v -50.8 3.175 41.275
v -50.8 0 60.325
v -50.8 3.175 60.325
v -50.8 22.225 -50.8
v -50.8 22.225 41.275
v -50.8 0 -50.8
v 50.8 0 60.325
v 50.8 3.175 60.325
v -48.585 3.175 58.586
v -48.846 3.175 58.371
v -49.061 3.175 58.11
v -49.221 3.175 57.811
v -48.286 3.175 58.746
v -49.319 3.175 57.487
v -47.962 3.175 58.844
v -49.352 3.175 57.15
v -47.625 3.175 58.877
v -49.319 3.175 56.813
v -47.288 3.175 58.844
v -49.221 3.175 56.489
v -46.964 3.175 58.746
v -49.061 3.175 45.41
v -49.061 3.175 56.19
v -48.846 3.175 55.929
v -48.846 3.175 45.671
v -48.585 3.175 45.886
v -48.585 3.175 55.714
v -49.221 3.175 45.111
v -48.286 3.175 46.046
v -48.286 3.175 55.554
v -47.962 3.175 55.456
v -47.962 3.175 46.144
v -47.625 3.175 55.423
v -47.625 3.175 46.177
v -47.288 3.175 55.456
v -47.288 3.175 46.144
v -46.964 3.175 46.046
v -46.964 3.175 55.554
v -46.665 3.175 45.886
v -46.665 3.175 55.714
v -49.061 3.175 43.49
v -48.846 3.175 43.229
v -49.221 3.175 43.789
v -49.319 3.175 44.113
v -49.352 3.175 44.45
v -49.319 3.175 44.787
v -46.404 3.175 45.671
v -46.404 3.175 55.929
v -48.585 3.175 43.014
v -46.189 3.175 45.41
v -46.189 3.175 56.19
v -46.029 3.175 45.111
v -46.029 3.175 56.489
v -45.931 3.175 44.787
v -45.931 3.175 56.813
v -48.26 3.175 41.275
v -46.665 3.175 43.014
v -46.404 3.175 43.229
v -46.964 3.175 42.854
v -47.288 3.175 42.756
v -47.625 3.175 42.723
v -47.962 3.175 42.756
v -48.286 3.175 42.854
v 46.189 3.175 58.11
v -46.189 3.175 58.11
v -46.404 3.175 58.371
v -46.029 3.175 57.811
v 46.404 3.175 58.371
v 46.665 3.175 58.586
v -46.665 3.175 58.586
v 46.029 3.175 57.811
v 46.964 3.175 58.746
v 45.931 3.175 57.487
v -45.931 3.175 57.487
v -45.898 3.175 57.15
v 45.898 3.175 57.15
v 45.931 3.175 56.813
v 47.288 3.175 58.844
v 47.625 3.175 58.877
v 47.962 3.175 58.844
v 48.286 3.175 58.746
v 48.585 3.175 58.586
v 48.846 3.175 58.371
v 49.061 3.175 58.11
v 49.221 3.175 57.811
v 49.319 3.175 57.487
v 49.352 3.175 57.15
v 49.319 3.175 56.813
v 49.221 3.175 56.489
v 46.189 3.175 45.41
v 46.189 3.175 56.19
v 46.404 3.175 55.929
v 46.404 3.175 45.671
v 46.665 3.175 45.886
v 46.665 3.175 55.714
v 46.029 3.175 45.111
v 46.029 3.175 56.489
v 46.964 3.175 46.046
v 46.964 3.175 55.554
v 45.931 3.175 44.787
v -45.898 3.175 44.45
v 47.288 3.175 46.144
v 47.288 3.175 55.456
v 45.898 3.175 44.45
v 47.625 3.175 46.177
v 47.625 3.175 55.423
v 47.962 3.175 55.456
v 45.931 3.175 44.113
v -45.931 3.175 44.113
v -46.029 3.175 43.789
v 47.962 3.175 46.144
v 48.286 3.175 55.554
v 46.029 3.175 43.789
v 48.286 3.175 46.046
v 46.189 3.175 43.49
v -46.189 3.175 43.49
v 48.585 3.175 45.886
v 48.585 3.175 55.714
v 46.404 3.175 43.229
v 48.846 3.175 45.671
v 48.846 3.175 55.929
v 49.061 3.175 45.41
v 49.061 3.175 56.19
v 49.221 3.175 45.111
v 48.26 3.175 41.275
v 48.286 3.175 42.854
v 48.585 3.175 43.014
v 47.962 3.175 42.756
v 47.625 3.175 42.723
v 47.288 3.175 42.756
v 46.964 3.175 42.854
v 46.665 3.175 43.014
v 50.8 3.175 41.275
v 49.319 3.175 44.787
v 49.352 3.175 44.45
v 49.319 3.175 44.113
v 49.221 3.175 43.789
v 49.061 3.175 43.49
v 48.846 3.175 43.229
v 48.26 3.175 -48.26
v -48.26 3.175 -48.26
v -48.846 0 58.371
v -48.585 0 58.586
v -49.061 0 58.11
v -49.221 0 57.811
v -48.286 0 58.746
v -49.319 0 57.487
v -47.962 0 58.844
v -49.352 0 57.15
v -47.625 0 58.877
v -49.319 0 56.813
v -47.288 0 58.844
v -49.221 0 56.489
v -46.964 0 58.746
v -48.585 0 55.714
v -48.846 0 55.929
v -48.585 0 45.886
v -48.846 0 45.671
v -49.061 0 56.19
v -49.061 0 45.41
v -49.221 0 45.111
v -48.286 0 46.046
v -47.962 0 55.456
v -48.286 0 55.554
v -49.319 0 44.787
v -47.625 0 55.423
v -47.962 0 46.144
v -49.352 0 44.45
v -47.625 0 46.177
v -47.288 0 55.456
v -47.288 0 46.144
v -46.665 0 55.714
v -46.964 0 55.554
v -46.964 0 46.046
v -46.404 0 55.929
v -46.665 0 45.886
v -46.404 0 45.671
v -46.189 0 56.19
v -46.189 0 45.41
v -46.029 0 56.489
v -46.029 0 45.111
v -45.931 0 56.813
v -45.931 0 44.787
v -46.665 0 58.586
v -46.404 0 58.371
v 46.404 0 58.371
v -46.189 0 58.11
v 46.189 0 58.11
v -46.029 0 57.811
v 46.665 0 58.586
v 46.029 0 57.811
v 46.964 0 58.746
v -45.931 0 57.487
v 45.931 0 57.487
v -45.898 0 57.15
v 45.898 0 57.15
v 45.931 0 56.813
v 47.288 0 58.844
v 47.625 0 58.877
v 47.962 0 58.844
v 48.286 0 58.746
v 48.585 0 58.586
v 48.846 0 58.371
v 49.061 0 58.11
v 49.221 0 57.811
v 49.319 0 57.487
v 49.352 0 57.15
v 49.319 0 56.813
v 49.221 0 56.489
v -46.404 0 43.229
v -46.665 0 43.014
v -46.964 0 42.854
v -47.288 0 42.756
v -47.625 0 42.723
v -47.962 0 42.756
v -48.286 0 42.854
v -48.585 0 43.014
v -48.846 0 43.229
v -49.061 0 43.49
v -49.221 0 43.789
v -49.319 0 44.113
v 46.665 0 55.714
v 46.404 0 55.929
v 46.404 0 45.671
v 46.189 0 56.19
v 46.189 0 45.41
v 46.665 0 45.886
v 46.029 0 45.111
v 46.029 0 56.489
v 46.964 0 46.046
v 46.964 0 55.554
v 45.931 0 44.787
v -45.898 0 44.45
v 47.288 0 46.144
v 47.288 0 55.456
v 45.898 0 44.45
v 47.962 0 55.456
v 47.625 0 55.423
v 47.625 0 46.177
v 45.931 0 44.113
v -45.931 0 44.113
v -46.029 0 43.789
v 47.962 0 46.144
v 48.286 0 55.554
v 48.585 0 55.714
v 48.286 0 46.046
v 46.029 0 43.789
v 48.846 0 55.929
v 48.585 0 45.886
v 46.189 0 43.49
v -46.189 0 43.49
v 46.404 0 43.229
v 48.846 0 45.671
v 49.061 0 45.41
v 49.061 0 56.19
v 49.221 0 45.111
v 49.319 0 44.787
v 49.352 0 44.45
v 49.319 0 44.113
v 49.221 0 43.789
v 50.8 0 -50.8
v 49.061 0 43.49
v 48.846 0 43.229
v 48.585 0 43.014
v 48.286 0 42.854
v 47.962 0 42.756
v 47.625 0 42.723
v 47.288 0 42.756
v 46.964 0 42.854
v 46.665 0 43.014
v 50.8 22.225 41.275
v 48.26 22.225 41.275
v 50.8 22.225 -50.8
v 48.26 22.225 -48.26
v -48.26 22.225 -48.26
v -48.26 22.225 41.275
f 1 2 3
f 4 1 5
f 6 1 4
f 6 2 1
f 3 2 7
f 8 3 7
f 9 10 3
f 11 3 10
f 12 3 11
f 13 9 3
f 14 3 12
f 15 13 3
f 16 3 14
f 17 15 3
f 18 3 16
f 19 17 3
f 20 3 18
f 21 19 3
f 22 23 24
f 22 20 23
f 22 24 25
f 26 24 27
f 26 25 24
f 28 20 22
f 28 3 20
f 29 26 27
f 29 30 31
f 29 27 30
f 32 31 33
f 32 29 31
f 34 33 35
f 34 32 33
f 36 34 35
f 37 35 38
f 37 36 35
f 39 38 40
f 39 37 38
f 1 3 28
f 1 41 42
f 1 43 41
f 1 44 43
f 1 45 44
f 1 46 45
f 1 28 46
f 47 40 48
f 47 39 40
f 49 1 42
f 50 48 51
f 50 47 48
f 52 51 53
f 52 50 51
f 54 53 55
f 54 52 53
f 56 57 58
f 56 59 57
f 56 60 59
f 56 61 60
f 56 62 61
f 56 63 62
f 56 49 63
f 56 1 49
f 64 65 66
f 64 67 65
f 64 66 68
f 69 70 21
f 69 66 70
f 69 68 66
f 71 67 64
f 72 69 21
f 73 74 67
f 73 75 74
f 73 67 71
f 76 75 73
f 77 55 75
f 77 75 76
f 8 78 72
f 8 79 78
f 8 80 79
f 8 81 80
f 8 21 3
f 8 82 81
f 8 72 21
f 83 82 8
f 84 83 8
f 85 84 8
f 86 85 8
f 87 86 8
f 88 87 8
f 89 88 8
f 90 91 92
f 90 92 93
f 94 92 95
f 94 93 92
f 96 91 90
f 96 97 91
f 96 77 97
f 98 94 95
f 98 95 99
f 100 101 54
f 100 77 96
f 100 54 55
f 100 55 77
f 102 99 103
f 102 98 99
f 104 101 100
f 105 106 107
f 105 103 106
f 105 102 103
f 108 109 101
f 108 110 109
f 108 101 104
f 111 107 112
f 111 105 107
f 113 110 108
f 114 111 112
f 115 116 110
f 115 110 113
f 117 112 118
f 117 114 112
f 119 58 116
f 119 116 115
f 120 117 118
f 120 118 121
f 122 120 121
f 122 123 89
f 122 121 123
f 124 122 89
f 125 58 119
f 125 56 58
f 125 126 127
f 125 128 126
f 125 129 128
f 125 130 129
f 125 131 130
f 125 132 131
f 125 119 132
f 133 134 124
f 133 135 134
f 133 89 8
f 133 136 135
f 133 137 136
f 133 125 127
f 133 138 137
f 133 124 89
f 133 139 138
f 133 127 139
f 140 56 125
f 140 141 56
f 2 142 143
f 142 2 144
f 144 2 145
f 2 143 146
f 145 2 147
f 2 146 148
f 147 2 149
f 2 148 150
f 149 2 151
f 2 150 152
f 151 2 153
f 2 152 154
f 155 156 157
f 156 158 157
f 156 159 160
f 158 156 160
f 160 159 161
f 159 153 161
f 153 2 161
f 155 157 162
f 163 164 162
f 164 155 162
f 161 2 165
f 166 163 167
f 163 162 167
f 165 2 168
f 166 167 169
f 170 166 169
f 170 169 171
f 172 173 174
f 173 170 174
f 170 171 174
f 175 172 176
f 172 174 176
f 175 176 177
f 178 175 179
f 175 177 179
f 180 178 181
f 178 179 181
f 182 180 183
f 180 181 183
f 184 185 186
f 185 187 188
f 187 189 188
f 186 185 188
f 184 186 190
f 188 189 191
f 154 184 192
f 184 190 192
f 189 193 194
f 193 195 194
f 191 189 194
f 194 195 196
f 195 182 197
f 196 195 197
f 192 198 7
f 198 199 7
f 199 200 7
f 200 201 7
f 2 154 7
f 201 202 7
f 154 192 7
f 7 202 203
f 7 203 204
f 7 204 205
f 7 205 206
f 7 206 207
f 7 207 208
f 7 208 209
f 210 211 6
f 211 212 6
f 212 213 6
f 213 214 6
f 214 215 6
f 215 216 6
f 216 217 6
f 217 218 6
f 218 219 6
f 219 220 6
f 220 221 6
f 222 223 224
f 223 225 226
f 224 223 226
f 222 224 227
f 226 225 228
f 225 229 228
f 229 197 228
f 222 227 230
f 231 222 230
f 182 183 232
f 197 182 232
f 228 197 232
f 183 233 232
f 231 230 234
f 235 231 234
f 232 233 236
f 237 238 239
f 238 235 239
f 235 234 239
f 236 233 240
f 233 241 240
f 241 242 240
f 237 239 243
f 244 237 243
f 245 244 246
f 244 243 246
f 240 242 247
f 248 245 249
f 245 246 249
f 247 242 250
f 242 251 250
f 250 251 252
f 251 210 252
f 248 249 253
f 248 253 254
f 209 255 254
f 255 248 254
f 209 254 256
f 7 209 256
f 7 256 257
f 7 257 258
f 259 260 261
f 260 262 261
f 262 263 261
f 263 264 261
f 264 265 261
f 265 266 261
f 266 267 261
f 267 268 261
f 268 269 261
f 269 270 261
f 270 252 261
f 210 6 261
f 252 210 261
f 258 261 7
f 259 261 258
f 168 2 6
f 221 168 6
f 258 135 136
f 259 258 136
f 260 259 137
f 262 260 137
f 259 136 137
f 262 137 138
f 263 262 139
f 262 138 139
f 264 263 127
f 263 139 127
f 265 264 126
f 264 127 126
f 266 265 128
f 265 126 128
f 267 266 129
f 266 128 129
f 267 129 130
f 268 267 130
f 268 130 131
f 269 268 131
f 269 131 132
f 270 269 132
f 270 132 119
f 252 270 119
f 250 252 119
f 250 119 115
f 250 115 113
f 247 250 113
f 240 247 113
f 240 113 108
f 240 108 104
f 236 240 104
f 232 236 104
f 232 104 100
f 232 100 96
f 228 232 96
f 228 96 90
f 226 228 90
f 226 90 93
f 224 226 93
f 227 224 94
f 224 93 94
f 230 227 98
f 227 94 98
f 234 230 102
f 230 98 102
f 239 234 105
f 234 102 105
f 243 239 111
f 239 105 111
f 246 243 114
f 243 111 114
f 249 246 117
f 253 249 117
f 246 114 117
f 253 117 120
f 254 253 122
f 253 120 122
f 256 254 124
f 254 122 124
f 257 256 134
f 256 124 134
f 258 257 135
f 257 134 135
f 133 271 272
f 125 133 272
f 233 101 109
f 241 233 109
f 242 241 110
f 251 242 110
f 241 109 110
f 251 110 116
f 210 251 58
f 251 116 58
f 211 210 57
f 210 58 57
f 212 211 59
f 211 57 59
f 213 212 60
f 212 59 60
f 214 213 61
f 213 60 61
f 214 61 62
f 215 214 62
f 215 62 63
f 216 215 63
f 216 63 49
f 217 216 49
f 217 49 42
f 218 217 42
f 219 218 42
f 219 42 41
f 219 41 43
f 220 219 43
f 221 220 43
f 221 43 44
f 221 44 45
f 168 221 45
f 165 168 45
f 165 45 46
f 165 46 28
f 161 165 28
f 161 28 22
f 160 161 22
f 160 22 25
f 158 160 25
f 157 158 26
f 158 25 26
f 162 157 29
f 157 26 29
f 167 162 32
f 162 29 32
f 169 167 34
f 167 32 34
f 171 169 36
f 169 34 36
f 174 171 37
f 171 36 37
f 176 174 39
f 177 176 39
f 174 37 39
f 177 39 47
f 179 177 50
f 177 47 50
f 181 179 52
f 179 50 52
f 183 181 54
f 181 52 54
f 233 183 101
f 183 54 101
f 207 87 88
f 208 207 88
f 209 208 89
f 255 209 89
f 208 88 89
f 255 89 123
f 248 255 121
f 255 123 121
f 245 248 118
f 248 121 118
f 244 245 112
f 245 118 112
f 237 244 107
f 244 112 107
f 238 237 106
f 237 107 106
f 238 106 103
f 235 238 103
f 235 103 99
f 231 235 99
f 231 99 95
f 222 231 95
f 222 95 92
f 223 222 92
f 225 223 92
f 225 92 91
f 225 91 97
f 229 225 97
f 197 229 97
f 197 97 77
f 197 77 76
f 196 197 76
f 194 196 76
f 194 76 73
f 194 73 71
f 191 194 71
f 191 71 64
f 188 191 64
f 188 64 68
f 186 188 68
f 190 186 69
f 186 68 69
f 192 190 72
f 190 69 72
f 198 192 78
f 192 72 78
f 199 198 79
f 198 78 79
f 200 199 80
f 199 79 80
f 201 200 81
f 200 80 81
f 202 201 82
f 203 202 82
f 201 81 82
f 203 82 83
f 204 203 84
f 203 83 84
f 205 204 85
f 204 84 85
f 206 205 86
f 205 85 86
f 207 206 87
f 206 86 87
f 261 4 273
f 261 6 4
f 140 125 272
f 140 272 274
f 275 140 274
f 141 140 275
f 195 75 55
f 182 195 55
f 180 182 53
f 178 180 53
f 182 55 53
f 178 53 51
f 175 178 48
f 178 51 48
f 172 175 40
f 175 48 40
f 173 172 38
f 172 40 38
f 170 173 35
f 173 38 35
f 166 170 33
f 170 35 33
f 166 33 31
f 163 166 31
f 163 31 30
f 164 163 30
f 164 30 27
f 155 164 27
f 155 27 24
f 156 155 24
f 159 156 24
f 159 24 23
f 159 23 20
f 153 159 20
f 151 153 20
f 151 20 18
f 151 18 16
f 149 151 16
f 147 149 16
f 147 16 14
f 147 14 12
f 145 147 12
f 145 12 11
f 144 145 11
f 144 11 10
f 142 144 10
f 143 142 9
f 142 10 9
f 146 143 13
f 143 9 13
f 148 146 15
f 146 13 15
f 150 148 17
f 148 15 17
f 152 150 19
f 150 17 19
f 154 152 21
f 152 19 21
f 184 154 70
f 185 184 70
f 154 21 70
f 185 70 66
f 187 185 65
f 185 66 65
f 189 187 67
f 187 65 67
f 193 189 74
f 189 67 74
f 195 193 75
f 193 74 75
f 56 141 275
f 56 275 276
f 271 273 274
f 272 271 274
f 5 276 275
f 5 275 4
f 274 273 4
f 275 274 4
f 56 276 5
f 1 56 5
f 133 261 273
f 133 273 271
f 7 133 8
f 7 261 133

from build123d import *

# Parameters (mm, degrees)
SKETCH1_W             = 101.6
SKETCH1_H             = 101.6
SKETCH1_W_2           = 6.35
SKETCH1_H_2           = 9.525
BOSS_EXTRUDE1_DEPTH   = 3.175
F_8_32_TAPPED_HOLE1_D = 3.4544
BOSS_EXTRUDE2_DEPTH   = 19.05
SKETCH1_3_W           = 88.9
SKETCH1_3_H           = 9.525
BOSS_EXTRUDE3_DEPTH   = 3.175


with BuildPart() as part:
    # Sketch1 → Boss-Extrude1 (new body)
    with BuildSketch(Plane(origin=(0, 0, 0), x_dir=(1, 0, 0), z_dir=(0, 1, 0))):
        Rectangle(SKETCH1_W, SKETCH1_H)
        with Locations((-47.625, -55.5625)):
            Rectangle(SKETCH1_W_2, SKETCH1_H_2)
        with Locations((47.625, -55.5625)):
            Rectangle(SKETCH1_W_2, SKETCH1_H_2)
    extrude(amount=BOSS_EXTRUDE1_DEPTH)

    # #8-32 Tapped Hole1 (through all)
    with Locations(Plane(origin=(0, 0, 0), x_dir=(-1, 0, 0), z_dir=(0, -1, 0))):
        with Locations((-47.625, -57.15), (-47.625, -44.45), (47.625, -57.15), (47.625, -44.45)):
            Hole(F_8_32_TAPPED_HOLE1_D / 2)

    # Sketch8 → Boss-Extrude2 (add)
    with BuildSketch(Plane(origin=(0, 3.175, 0), x_dir=(1, 0, 0), z_dir=(0, 1, 0))):
        Polygon((-50.8, 50.8), (50.8, 50.8), (50.8, -41.275), (48.26, -41.275), (48.26, 48.26), (-48.26, 48.26), (-48.26, -41.275), (-50.8, -41.275), align=None)
    extrude(amount=BOSS_EXTRUDE2_DEPTH)

    # Sketch1<3> → Boss-Extrude3 (add)
    with BuildSketch(Plane(origin=(0, 0, 0), x_dir=(1, 0, 0), z_dir=(0, 1, 0))):
        with Locations((0, -55.5625)):
            Rectangle(SKETCH1_3_W, SKETCH1_3_H)
    extrude(amount=BOSS_EXTRUDE3_DEPTH)


solid = part.part
